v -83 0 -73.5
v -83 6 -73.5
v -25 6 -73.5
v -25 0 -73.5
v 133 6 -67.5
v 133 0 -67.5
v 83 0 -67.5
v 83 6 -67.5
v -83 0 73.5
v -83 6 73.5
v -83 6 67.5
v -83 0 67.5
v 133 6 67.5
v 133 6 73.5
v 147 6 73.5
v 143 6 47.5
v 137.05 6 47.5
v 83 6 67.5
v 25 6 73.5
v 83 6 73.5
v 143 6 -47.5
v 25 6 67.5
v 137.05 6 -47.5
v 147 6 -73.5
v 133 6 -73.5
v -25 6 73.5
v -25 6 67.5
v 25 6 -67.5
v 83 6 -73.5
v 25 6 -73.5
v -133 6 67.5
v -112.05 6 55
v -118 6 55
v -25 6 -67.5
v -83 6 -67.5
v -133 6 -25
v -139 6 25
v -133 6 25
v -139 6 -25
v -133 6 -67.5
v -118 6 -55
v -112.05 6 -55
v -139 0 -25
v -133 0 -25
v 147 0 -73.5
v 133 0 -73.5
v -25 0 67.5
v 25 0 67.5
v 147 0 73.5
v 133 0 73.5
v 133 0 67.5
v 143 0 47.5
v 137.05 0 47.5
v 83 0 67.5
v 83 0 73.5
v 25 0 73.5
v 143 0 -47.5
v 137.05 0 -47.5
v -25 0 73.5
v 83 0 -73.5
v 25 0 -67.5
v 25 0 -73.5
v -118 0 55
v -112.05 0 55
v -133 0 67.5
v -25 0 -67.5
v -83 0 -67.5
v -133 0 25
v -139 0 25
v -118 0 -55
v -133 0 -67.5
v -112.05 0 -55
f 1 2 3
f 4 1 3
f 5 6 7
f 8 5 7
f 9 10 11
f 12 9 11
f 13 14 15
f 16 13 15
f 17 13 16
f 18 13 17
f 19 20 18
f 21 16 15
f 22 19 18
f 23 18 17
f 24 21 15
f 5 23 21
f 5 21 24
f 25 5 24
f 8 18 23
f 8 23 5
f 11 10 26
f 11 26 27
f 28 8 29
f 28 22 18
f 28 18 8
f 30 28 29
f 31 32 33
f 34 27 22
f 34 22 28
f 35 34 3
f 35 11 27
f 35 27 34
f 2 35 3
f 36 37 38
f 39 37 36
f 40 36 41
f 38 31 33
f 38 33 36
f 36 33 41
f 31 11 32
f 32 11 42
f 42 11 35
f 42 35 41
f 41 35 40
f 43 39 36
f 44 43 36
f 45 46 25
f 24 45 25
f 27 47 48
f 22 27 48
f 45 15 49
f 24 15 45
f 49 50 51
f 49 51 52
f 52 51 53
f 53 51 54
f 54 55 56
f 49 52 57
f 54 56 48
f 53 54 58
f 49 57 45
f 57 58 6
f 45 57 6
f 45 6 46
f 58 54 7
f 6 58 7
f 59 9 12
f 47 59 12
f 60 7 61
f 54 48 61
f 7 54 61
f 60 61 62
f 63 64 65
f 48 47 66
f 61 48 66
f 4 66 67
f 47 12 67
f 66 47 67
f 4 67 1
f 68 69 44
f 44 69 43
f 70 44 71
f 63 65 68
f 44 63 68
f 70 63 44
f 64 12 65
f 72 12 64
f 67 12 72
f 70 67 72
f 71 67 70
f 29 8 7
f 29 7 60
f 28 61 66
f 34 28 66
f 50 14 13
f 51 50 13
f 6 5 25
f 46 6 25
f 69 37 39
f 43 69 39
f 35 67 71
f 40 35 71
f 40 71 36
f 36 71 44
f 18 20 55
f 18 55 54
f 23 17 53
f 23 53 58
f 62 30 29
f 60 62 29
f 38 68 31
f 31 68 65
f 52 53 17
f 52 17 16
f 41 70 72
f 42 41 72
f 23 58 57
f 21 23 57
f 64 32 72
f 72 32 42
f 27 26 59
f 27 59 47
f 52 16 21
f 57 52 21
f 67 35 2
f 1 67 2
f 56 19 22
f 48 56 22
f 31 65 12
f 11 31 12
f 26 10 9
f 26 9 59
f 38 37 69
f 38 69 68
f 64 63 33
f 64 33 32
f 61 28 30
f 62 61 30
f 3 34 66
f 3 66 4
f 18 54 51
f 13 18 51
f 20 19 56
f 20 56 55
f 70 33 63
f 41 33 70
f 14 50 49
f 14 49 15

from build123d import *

# Parameters (mm, degrees)
SALIENTE_EXTRUIR1_DEPTH = 6
CROQUIS2_W              = 58
CROQUIS2_H              = 6
SALIENTE_EXTRUIR2_DEPTH = 6
CROQUIS3_W              = 6
CROQUIS3_H              = 50
SALIENTE_EXTRUIR3_DEPTH = 6
CROQUIS5_W              = 5.95
CROQUIS5_H              = 110
CORTAR_EXTRUIR2_DEPTH   = 7
CROQUIS6_W              = 147
CROQUIS6_H              = 6
SALIENTE_EXTRUIR4_DEPTH = 14
CROQUIS7_W              = 5.95
CROQUIS7_H              = 95
CORTAR_EXTRUIR3_DEPTH   = 7


with BuildPart() as part:
    # Croquis1 → Saliente-Extruir1 (new body)
    with BuildSketch(Plane(origin=(0, 0, 0), x_dir=(1, 0, 0), z_dir=(0, 1, 0))):
        Polygon((-83, 67.5), (-133, 67.5), (-133, 25), (-133, -25), (-133, -67.5), (133, -67.5), (133, 67.5), (72.5, 67.5), (25, 67.5), (-25, 67.5), align=None)
    extrude(amount=SALIENTE_EXTRUIR1_DEPTH)

    # Croquis2 → Saliente-Extruir2 (add)
    with BuildSketch(Plane(origin=(0, 6, 0), x_dir=(1, 0, 0), z_dir=(0, 1, 0))):
        with Locations((-54, 70.5)):
            Rectangle(CROQUIS2_W, CROQUIS2_H)
        with Locations((54, 70.5)):
            Rectangle(CROQUIS2_W, CROQUIS2_H)
        with Locations((-54, -70.5)):
            Rectangle(CROQUIS2_W, CROQUIS2_H)
        with Locations((54, -70.5)):
            Rectangle(CROQUIS2_W, CROQUIS2_H)
    extrude(amount=-SALIENTE_EXTRUIR2_DEPTH)

    # Croquis3 → Saliente-Extruir3 (add)
    with BuildSketch(Plane(origin=(0, 6, 0), x_dir=(1, 0, 0), z_dir=(0, 1, 0))):
        with Locations((-136, 0)):
            Rectangle(CROQUIS3_W, CROQUIS3_H)
    extrude(amount=-SALIENTE_EXTRUIR3_DEPTH)

    # Croquis5 → Cortar-Extruir2 (cut, through all)
    with BuildSketch(Plane(origin=(0, 6, 0), x_dir=(1, 0, 0), z_dir=(0, 1, 0))):
        with Locations((-115.025, 0)):
            Rectangle(CROQUIS5_W, CROQUIS5_H)
    extrude(amount=-CORTAR_EXTRUIR2_DEPTH, mode=Mode.SUBTRACT)

    # Croquis6 → Saliente-Extruir4 (add)
    with BuildSketch(Plane(origin=(133, 0, 0), x_dir=(0, 0, -1), z_dir=(1, 0, 0))):
        with Locations((0, 3)):
            Rectangle(CROQUIS6_W, CROQUIS6_H)
    extrude(amount=SALIENTE_EXTRUIR4_DEPTH)

    # Croquis7 → Cortar-Extruir3 (cut, through all)
    with BuildSketch(Plane(origin=(0, 6, 0), x_dir=(1, 0, 0), z_dir=(0, 1, 0))):
        with Locations((140.025, 0)):
            Rectangle(CROQUIS7_W, CROQUIS7_H)
    extrude(amount=-CORTAR_EXTRUIR3_DEPTH, mode=Mode.SUBTRACT)


solid = part.part
